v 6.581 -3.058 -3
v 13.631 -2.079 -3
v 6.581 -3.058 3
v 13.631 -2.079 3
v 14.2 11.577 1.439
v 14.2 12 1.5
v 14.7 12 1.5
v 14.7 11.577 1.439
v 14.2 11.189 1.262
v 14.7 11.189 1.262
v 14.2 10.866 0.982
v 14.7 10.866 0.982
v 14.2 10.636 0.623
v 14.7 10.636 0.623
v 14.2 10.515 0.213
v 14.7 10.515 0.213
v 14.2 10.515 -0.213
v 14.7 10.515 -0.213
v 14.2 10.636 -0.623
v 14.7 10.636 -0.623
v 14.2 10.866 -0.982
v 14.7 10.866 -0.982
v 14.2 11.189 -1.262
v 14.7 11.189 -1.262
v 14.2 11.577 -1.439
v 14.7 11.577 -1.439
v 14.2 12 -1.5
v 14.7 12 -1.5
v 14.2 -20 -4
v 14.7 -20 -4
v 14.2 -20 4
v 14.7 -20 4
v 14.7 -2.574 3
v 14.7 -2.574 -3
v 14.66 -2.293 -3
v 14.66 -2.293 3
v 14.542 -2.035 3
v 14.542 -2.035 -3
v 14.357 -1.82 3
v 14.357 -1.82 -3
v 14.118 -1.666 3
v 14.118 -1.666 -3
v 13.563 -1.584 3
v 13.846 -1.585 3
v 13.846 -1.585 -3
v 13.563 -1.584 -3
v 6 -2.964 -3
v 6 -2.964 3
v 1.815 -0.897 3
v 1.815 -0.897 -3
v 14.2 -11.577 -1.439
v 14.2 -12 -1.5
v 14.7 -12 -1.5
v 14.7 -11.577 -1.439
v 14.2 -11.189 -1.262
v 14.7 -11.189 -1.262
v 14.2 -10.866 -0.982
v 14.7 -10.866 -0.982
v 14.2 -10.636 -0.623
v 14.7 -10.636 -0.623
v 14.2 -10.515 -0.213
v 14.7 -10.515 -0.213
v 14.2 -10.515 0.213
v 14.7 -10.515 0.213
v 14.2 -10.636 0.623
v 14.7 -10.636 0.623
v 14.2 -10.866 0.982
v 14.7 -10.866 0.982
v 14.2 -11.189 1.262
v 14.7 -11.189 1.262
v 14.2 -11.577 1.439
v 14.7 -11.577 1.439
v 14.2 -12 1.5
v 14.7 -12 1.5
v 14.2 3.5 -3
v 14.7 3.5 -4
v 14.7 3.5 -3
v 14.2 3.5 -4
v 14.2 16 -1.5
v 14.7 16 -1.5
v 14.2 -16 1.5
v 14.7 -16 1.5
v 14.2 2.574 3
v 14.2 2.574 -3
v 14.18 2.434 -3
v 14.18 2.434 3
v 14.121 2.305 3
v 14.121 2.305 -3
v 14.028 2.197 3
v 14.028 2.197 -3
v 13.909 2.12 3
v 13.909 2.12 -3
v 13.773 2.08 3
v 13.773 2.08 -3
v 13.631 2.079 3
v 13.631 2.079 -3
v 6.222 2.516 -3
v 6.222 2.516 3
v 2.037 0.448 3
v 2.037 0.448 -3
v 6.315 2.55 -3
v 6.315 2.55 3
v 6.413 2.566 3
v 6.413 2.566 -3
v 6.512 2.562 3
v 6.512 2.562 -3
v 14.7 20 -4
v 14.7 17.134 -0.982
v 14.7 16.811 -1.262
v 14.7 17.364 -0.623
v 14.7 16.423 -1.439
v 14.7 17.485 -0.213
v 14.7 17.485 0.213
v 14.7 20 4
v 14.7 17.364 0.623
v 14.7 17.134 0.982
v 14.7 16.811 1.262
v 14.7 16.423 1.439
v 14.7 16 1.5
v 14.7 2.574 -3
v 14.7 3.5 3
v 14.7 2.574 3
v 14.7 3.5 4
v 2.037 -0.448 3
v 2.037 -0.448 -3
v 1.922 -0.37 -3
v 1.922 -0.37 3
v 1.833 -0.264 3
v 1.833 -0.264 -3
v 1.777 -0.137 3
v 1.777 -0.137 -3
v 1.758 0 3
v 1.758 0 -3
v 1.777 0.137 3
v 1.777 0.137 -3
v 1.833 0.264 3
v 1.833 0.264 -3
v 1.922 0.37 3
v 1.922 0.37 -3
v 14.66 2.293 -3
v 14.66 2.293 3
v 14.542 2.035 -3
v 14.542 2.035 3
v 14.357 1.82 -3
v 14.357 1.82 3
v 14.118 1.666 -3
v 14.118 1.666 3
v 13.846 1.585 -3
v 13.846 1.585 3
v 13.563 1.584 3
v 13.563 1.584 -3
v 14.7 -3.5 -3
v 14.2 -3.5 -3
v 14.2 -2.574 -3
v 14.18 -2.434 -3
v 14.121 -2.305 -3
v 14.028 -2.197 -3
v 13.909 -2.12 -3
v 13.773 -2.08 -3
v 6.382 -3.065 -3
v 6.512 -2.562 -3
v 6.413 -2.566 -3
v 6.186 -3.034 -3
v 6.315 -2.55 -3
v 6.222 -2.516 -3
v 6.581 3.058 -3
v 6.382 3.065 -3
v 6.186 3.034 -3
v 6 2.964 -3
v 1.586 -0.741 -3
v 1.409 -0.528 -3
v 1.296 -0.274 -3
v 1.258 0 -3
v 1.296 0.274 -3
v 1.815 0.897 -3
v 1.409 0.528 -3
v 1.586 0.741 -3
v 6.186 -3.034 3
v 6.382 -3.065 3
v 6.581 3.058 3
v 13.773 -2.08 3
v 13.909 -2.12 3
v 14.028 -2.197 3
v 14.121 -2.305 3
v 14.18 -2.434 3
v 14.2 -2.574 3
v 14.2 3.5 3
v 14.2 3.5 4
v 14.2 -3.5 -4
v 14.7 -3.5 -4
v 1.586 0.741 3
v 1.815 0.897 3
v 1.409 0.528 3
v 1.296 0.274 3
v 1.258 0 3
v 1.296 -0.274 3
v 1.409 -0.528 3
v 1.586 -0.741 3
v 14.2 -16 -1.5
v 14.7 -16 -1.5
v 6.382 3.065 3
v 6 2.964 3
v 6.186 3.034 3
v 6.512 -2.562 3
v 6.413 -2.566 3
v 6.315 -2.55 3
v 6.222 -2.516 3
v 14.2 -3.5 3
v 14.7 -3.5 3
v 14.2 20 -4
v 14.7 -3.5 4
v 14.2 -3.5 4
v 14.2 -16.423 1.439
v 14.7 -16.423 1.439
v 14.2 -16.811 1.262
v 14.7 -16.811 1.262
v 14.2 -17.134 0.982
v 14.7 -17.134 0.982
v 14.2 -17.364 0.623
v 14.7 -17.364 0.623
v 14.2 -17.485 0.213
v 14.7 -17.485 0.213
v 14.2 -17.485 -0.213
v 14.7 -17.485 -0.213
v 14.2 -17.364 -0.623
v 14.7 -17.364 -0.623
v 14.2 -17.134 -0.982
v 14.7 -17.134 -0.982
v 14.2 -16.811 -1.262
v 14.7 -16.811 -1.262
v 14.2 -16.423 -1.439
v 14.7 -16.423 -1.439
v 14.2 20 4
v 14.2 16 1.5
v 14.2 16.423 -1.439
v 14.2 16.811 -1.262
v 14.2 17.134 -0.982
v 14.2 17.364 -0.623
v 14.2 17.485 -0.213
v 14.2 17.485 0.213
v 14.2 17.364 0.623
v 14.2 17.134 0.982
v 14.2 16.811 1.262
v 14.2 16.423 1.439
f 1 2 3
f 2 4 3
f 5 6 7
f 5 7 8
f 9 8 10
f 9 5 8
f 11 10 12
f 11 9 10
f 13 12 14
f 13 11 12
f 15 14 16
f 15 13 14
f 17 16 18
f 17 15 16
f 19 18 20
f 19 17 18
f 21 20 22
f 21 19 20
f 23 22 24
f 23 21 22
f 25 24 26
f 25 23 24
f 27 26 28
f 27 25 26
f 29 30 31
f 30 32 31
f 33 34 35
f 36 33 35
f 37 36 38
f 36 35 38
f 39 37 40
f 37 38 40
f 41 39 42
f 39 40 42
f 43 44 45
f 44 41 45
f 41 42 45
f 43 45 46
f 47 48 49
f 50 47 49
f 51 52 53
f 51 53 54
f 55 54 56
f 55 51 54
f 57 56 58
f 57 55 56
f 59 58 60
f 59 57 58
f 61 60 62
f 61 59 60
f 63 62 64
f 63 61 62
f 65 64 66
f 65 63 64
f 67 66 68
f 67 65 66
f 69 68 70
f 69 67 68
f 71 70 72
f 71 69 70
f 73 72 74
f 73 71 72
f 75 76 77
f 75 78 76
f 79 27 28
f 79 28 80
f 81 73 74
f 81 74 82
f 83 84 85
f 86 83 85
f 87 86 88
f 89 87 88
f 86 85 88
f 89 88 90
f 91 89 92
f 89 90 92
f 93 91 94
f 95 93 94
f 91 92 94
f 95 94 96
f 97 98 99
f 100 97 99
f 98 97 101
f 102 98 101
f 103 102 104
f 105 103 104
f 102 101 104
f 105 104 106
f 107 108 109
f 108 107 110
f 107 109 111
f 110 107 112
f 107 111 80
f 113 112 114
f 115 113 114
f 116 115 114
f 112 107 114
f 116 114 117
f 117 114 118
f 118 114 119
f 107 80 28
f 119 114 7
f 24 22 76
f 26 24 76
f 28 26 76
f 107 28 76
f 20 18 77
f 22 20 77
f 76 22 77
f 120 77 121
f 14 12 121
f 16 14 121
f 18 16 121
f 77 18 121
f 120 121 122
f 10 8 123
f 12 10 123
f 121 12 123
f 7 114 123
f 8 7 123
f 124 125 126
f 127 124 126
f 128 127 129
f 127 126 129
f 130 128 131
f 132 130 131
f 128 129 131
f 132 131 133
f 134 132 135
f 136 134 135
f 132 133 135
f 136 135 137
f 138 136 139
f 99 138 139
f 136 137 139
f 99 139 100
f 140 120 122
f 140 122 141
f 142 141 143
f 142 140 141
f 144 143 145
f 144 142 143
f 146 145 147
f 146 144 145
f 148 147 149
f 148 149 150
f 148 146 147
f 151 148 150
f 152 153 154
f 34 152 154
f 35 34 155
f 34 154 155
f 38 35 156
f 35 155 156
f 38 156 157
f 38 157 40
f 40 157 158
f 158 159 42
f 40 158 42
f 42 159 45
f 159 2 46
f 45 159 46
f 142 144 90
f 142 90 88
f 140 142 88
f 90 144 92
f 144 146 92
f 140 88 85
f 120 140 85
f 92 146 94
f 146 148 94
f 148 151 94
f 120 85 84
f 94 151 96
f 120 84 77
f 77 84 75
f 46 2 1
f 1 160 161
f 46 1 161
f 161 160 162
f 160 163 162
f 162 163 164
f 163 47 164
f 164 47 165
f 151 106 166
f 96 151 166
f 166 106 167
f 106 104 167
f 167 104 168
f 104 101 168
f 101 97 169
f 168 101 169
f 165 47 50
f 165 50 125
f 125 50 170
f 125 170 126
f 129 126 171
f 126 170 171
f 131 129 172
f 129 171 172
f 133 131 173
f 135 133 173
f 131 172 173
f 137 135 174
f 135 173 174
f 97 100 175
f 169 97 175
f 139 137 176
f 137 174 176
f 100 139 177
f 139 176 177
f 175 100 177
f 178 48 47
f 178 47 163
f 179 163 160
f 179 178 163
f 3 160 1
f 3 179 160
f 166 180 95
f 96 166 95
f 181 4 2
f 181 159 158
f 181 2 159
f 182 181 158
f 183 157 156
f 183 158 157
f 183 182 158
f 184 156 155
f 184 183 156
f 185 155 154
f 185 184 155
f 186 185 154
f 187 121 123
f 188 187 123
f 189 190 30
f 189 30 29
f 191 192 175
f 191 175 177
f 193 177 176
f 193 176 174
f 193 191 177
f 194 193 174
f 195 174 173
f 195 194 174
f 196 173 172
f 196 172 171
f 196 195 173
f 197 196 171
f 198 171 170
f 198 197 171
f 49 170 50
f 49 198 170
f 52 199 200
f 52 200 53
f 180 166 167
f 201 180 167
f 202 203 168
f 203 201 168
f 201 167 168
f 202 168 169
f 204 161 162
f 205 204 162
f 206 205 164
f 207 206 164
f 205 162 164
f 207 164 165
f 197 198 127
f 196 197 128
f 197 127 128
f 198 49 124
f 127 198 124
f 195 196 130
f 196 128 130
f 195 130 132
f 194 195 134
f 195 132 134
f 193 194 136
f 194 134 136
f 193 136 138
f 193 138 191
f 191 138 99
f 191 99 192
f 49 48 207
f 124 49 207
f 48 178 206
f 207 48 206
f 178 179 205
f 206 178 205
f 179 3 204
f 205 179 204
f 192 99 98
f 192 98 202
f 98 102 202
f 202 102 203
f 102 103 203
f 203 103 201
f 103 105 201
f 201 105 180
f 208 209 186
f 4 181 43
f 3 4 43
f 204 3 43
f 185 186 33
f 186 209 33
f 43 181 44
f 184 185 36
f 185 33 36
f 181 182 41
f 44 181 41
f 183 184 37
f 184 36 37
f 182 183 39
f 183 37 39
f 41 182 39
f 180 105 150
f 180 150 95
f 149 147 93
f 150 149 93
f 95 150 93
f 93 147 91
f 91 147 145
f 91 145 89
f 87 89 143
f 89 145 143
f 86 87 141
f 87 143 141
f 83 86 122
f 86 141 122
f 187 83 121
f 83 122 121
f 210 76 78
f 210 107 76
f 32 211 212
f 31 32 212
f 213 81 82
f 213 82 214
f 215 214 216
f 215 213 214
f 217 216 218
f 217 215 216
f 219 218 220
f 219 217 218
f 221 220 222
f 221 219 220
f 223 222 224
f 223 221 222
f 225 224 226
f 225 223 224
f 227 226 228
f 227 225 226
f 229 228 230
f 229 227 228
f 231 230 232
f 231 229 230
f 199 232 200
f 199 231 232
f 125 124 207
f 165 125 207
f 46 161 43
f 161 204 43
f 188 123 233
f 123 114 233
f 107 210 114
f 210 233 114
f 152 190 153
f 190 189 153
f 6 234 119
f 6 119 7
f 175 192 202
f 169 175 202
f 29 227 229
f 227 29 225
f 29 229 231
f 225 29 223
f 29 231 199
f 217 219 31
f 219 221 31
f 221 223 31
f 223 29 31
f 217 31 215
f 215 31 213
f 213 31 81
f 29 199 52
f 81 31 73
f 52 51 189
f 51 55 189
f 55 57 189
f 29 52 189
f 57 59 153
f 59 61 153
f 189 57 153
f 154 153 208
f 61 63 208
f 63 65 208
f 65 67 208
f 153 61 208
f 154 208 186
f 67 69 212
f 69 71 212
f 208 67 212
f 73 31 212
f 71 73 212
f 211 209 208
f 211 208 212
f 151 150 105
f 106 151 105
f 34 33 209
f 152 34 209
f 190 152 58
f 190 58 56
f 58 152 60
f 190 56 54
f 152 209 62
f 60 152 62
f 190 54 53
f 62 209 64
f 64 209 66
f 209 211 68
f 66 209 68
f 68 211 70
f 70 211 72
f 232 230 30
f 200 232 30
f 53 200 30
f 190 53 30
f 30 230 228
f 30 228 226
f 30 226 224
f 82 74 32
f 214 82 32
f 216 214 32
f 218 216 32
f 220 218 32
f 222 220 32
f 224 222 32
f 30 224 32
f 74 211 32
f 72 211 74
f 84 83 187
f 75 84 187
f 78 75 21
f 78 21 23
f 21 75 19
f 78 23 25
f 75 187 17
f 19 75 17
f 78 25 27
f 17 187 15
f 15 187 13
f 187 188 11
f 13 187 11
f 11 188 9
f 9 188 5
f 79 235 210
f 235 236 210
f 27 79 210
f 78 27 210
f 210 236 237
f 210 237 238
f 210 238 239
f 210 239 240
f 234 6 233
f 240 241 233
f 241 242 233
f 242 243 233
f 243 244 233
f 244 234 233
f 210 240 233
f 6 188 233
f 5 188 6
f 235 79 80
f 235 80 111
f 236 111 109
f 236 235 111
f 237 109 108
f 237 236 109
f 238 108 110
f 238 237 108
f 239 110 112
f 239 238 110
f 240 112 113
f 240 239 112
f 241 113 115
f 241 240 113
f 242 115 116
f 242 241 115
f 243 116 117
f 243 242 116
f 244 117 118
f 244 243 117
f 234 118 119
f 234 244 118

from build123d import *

# Parameters (mm, degrees)
EXTRUDE_1_DEPTH     = 4
FILLET_1_R          = 0.5
FILLET_2_R          = 1
CUT_EXTRUDE_1_DEPTH = 0.5
SKETCH_3_W          = 3.444181234
SKETCH_3_H          = 7
SKETCH_3_W_2        = 2.596632025
CUT_EXTRUDE_2_DEPTH = 17


with BuildPart() as part:
    # 草图1 → 凸台-拉伸1 (new, symmetric)
    with BuildSketch(Plane.XY):
        Polygon((0, 0), (6.275985866, 3.1), (14.2, 2), (14.2, 20), (14.7, 20), (14.7, 1.425796077), (6.359548127, 2.583605352), (1.1290092, 0), (6.359548127, -2.583605352), (14.7, -1.425796077), (14.7, -20), (14.2, -20), (14.2, -2), (6.275985866, -3.1), align=None)
    extrude(amount=EXTRUDE_1_DEPTH, both=True)

    # 圆角1
    fillet_1_edges = [part.edges().sort_by_distance(p)[0] for p in [
        (14.2, 2, 0),
        (6.359548127, 2.583605352, 0),
        (1.1290092, 0, 0),
        (6.359548127, -2.583605352, 0),
        (14.2, -2, 0),
    ]]
    fillet(fillet_1_edges, radius=FILLET_1_R)

    # 圆角2
    fillet_2_edges = [part.edges().sort_by_distance(p)[0] for p in [
        (0, 0, 0),
        (6.275985866, 3.1, 0),
        (14.7, 1.425796077, 0),
        (14.7, -1.425796077, 0),
        (6.275985866, -3.1, 0),
    ]]
    fillet(fillet_2_edges, radius=FILLET_2_R)

    # 草图2 → 切除-拉伸1 (cut)
    with BuildSketch(Plane.ZY.offset(-14.2)):
        with BuildLine():
            Line((1.5, 16), (1.5, 12))
            ThreePointArc((1.5, 12), (0, 10.5), (-1.5, 12))
            Line((-1.5, 12), (-1.5, 16))
            ThreePointArc((-1.5, 16), (0, 17.5), (1.5, 16))
        make_face()
        with BuildLine():
            Line((1.5, -12), (1.5, -16))
            ThreePointArc((1.5, -16), (0, -17.5), (-1.5, -16))
            Line((-1.5, -16), (-1.5, -12))
            ThreePointArc((-1.5, -12), (0, -10.5), (1.5, -12))
        make_face()
    extrude(amount=-CUT_EXTRUDE_1_DEPTH, mode=Mode.SUBTRACT)

    # 草图3 → 切除-拉伸2 (cut, symmetric)
    with BuildSketch(Plane.ZY.offset(-14.2)):
        with Locations((4.722090617, 0)):
            Rectangle(SKETCH_3_W, SKETCH_3_H)
        with Locations((-4.298316013, 0)):
            Rectangle(SKETCH_3_W_2, SKETCH_3_H)
    extrude(amount=CUT_EXTRUDE_2_DEPTH, both=True, mode=Mode.SUBTRACT)


solid = part.part
